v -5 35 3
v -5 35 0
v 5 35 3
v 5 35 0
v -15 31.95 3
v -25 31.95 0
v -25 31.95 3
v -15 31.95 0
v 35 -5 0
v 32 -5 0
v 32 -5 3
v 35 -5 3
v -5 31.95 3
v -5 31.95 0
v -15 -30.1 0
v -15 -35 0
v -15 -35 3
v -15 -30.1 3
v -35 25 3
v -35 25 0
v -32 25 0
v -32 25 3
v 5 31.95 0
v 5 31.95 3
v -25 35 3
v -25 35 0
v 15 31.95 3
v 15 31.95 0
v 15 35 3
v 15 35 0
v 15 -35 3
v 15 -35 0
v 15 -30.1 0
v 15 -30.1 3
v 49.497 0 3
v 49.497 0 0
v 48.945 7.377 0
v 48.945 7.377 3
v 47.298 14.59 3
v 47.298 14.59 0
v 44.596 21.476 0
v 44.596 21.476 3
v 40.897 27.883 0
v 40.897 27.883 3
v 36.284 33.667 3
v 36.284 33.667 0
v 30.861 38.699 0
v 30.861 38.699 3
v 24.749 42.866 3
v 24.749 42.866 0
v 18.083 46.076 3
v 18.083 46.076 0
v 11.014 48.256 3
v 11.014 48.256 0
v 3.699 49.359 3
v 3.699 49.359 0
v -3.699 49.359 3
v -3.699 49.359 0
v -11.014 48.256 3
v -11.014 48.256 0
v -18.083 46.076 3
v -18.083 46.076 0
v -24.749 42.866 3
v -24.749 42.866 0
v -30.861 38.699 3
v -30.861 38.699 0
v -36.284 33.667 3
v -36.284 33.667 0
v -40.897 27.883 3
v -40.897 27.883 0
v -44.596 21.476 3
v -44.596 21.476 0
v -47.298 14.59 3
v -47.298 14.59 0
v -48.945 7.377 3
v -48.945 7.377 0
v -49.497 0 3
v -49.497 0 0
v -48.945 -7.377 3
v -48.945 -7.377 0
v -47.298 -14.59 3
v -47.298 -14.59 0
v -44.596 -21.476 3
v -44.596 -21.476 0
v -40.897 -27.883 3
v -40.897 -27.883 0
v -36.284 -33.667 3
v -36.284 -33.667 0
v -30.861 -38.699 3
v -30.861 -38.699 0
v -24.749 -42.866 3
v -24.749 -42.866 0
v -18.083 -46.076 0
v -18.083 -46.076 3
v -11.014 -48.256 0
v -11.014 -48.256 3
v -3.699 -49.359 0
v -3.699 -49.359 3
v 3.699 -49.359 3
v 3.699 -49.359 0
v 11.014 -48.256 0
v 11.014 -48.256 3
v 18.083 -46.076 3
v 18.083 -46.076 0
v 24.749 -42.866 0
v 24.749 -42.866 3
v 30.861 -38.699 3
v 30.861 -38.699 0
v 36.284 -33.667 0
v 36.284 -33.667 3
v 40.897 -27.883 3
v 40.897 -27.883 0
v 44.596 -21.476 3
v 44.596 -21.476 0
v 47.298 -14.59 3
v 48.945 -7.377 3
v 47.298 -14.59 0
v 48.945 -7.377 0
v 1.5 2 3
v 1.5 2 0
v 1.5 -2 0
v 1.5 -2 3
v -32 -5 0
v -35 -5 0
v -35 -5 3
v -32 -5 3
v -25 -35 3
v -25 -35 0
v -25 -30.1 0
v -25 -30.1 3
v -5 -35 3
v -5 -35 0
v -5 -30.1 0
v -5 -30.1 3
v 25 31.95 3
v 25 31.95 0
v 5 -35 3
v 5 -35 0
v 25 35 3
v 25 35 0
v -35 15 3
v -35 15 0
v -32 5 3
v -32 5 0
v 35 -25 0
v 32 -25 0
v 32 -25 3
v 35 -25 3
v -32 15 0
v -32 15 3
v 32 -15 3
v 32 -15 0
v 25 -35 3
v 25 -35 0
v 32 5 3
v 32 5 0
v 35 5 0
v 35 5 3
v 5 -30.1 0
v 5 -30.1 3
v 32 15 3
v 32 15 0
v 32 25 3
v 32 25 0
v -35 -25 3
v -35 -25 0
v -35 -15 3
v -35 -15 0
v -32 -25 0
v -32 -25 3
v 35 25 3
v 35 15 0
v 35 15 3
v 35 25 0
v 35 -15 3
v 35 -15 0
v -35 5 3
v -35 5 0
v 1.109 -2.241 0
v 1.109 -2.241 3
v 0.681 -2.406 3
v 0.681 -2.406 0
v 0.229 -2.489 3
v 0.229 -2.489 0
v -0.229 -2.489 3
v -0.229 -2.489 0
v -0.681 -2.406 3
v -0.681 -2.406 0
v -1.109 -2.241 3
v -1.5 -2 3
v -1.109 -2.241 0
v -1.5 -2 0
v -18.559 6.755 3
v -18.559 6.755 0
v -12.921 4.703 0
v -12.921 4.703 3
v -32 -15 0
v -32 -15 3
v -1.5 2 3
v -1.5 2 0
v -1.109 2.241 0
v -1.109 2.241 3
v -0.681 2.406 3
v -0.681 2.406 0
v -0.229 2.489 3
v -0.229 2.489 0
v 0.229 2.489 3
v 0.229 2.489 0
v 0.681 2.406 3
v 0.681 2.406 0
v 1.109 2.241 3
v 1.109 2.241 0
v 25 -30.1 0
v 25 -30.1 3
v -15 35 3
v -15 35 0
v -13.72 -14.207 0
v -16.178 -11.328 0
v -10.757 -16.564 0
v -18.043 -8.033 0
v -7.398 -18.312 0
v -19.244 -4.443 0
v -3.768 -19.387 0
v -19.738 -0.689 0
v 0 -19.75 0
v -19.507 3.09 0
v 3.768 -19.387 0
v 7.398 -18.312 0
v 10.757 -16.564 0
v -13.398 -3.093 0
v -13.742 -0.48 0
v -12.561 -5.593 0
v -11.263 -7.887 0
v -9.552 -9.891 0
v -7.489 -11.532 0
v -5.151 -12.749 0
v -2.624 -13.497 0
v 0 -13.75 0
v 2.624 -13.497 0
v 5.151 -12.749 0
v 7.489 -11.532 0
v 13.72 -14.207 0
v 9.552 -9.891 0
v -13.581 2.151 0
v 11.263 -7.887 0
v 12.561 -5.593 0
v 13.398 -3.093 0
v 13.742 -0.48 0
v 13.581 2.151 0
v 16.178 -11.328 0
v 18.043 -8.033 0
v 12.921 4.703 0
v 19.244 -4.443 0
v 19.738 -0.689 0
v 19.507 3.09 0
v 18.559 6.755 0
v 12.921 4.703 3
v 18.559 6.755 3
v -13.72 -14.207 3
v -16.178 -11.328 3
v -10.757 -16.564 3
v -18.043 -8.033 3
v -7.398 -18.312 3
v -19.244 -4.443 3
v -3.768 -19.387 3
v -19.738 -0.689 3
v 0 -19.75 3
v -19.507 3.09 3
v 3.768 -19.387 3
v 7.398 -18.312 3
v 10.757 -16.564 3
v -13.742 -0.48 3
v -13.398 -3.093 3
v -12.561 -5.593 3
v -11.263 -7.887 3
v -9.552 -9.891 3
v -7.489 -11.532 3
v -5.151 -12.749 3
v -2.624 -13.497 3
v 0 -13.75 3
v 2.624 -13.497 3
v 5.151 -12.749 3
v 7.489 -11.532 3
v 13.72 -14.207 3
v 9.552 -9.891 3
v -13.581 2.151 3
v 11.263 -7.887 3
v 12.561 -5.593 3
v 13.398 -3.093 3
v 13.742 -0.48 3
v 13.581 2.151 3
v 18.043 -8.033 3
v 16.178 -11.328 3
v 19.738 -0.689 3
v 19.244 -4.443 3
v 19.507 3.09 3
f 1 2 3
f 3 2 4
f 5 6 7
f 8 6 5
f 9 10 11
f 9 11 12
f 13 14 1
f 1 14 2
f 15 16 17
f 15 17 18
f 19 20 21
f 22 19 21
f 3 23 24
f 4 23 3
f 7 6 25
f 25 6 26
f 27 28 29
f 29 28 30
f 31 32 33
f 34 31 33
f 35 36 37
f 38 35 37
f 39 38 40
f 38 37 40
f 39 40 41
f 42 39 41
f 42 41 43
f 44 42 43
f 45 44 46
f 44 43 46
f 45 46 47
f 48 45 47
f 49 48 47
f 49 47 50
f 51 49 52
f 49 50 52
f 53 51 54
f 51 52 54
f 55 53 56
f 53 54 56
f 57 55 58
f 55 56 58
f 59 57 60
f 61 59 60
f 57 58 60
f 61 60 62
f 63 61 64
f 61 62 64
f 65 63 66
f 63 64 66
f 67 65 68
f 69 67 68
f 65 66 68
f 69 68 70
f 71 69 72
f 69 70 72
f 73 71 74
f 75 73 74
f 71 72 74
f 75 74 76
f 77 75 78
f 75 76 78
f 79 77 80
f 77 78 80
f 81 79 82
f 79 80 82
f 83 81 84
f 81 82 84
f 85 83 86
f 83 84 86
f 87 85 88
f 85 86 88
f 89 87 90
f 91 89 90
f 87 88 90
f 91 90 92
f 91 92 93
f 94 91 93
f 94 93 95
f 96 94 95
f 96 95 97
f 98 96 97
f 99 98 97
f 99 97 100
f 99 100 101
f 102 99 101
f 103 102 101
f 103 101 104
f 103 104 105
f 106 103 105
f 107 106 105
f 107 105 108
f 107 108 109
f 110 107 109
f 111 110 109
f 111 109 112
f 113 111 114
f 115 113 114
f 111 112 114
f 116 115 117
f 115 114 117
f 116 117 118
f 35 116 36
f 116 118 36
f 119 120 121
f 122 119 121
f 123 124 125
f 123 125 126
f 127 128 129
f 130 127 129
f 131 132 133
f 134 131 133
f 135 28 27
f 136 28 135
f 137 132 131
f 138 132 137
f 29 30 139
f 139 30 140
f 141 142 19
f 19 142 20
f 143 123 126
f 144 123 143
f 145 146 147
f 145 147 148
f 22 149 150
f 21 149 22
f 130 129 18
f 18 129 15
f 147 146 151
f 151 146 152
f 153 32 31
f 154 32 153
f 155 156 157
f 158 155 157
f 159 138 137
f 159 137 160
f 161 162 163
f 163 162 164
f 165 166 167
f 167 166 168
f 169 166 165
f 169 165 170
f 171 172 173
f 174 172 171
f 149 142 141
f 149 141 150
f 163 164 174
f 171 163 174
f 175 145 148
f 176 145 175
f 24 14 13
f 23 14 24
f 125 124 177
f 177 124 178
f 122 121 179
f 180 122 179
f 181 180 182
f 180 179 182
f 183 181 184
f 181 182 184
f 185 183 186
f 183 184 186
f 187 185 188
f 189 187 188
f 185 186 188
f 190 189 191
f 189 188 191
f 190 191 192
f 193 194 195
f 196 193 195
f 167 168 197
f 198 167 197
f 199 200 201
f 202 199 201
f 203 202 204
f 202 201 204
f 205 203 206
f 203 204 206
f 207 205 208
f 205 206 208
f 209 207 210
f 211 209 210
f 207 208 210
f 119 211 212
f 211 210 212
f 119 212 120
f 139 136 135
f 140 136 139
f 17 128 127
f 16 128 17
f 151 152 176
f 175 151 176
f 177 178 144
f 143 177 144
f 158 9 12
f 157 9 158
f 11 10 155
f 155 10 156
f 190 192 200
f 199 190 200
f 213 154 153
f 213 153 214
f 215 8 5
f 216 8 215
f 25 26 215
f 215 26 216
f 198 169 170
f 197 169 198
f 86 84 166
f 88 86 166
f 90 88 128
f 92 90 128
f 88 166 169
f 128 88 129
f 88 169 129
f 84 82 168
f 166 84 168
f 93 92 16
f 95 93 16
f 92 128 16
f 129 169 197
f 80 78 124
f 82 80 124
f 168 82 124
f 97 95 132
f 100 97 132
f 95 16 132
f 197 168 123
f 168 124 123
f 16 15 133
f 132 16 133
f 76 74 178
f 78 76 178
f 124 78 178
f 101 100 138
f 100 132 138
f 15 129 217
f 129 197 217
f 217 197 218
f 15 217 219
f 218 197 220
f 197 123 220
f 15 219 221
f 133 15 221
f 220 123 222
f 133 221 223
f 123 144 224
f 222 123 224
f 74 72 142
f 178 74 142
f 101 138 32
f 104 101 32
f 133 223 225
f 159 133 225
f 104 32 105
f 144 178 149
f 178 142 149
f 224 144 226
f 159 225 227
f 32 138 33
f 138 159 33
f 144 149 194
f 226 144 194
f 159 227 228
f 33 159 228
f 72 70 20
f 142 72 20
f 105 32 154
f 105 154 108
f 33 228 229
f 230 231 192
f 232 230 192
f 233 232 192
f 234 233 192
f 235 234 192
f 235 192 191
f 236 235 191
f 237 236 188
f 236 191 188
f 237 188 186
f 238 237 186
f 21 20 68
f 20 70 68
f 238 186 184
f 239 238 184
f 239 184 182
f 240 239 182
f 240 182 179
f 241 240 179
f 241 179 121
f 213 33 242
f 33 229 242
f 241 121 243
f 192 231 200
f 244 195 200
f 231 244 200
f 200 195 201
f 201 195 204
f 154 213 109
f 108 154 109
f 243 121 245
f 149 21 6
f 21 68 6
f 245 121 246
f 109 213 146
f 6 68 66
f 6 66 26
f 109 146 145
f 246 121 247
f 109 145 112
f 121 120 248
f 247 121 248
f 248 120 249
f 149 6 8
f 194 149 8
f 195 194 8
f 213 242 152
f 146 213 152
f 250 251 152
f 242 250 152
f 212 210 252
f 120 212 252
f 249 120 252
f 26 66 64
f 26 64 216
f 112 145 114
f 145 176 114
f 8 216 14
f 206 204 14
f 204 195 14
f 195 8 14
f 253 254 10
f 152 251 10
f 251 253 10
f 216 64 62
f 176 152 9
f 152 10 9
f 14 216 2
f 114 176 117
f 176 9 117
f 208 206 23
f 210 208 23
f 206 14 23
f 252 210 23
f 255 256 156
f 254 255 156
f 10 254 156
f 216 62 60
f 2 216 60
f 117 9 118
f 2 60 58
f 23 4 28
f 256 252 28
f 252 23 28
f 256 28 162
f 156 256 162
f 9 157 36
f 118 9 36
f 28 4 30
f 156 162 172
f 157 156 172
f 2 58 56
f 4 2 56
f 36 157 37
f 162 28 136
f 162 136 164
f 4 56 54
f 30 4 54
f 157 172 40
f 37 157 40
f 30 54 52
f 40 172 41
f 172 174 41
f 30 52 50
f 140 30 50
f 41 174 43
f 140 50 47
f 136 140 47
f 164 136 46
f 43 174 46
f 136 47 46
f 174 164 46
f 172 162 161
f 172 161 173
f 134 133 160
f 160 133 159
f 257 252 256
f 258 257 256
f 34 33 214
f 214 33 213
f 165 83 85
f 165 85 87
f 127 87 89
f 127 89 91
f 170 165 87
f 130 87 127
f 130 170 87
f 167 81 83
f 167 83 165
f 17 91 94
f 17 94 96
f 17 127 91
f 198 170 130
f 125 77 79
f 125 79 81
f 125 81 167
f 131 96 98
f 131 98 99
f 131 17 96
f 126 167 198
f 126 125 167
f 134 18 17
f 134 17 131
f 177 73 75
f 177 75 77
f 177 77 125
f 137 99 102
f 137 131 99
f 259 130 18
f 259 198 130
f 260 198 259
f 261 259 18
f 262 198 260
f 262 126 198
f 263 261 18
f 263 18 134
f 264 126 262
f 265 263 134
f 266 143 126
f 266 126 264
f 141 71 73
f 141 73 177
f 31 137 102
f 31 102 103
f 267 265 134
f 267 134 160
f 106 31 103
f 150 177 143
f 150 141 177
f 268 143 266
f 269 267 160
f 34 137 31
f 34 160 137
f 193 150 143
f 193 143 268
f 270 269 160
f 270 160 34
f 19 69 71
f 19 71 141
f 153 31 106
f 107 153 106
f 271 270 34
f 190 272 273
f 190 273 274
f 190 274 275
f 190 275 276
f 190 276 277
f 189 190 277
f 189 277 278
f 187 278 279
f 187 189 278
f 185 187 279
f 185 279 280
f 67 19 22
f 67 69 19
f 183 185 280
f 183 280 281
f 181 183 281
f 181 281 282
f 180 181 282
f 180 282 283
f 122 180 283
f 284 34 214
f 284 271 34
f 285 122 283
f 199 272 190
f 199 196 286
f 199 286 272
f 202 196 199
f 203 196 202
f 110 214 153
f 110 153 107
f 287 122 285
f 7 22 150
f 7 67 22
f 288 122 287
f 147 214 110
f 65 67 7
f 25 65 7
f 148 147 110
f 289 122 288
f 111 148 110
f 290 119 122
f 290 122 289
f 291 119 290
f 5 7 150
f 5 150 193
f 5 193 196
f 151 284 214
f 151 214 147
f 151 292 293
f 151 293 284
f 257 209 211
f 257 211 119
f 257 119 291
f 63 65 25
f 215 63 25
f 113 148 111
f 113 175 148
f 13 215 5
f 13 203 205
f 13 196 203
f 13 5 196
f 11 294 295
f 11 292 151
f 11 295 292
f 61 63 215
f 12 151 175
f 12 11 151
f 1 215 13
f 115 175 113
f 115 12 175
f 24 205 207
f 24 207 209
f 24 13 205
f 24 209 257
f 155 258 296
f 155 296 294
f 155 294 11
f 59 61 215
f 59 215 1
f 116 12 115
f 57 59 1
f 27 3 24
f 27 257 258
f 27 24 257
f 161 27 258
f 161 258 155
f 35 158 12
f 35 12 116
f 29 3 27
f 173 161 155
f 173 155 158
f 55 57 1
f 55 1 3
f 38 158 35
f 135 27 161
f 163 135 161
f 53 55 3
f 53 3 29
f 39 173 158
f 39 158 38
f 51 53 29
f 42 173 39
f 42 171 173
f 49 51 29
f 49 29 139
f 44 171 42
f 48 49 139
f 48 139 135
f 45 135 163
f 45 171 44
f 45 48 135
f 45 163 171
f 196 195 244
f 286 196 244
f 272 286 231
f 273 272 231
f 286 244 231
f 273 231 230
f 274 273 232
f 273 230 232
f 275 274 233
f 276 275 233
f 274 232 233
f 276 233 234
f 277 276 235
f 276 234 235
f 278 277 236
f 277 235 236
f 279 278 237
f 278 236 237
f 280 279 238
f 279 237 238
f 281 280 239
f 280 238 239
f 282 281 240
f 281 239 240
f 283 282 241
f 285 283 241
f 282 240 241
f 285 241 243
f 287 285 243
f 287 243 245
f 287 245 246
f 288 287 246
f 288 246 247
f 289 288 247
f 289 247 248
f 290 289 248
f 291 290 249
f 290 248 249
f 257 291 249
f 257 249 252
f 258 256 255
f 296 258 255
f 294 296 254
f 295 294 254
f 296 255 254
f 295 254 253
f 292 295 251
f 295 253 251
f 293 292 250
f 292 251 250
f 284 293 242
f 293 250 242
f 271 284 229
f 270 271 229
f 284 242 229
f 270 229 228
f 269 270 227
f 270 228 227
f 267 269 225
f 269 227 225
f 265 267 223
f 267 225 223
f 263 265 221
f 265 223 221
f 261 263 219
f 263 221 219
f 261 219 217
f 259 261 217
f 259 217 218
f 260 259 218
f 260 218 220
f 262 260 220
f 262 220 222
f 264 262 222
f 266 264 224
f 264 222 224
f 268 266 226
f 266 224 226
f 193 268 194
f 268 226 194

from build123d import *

# Parameters (mm, degrees)
F0_R     = 49.4974746831
F0_W     = 10
F0_H     = 4.9
F0_W_2   = 3
F0_H_2   = 10
F0_H_3   = 3.05
F1_DEPTH = 3


with BuildPart() as f1:
    # F0 (on Top) → F1 (new body)
    with BuildSketch(Plane.XY):
        Circle(F0_R)
        with Locations((-19.9997237325, -32.55)):
            Rectangle(F0_W, F0_H, mode=Mode.SUBTRACT)
        with Locations((-33.5, -20)):
            Rectangle(F0_W_2, F0_H_2, mode=Mode.SUBTRACT)
        with Locations((0.0002762675, -32.55)):
            Rectangle(F0_W, F0_H, mode=Mode.SUBTRACT)
        with Locations((20.0002762675, -32.55)):
            Rectangle(F0_W, F0_H, mode=Mode.SUBTRACT)
        with BuildLine():
            ThreePointArc((18.5589292605, 6.7548978307), (0, -19.75), (-18.5589292605, 6.7548978307))
            Line((-18.5589292605, 6.7548978307), (-12.9207735358, 4.7027769707))
            ThreePointArc((-12.9207735358, 4.7027769707), (0, -13.75), (12.9207735358, 4.7027769707))
            Line((12.9207735358, 4.7027769707), (18.5589292605, 6.7548978307))
        make_face(mode=Mode.SUBTRACT)
        with Locations((33.5, -20)):
            Rectangle(F0_W_2, F0_H_2, mode=Mode.SUBTRACT)
        with Locations((-33.5, 0)):
            Rectangle(F0_W_2, F0_H_2, mode=Mode.SUBTRACT)
        with Locations((-33.5, 20)):
            Rectangle(F0_W_2, F0_H_2, mode=Mode.SUBTRACT)
        with Locations((-20, 33.475)):
            Rectangle(F0_W, F0_H_3, mode=Mode.SUBTRACT)
        with BuildLine():
            ThreePointArc((-1.5, 2), (0, 2.5), (1.5, 2))
            Line((1.5, 2), (1.5, -2))
            ThreePointArc((1.5, -2), (0, -2.5), (-1.5, -2))
            Line((-1.5, -2), (-1.5, 2))
        make_face(mode=Mode.SUBTRACT)
        with Locations((33.5, 0)):
            Rectangle(F0_W_2, F0_H_2, mode=Mode.SUBTRACT)
        with Locations((33.5, 20)):
            Rectangle(F0_W_2, F0_H_2, mode=Mode.SUBTRACT)
        with Locations((0, 33.475)):
            Rectangle(F0_W, F0_H_3, mode=Mode.SUBTRACT)
        with Locations((20, 33.475)):
            Rectangle(F0_W, F0_H_3, mode=Mode.SUBTRACT)
    extrude(amount=F1_DEPTH)


solid = f1.part
